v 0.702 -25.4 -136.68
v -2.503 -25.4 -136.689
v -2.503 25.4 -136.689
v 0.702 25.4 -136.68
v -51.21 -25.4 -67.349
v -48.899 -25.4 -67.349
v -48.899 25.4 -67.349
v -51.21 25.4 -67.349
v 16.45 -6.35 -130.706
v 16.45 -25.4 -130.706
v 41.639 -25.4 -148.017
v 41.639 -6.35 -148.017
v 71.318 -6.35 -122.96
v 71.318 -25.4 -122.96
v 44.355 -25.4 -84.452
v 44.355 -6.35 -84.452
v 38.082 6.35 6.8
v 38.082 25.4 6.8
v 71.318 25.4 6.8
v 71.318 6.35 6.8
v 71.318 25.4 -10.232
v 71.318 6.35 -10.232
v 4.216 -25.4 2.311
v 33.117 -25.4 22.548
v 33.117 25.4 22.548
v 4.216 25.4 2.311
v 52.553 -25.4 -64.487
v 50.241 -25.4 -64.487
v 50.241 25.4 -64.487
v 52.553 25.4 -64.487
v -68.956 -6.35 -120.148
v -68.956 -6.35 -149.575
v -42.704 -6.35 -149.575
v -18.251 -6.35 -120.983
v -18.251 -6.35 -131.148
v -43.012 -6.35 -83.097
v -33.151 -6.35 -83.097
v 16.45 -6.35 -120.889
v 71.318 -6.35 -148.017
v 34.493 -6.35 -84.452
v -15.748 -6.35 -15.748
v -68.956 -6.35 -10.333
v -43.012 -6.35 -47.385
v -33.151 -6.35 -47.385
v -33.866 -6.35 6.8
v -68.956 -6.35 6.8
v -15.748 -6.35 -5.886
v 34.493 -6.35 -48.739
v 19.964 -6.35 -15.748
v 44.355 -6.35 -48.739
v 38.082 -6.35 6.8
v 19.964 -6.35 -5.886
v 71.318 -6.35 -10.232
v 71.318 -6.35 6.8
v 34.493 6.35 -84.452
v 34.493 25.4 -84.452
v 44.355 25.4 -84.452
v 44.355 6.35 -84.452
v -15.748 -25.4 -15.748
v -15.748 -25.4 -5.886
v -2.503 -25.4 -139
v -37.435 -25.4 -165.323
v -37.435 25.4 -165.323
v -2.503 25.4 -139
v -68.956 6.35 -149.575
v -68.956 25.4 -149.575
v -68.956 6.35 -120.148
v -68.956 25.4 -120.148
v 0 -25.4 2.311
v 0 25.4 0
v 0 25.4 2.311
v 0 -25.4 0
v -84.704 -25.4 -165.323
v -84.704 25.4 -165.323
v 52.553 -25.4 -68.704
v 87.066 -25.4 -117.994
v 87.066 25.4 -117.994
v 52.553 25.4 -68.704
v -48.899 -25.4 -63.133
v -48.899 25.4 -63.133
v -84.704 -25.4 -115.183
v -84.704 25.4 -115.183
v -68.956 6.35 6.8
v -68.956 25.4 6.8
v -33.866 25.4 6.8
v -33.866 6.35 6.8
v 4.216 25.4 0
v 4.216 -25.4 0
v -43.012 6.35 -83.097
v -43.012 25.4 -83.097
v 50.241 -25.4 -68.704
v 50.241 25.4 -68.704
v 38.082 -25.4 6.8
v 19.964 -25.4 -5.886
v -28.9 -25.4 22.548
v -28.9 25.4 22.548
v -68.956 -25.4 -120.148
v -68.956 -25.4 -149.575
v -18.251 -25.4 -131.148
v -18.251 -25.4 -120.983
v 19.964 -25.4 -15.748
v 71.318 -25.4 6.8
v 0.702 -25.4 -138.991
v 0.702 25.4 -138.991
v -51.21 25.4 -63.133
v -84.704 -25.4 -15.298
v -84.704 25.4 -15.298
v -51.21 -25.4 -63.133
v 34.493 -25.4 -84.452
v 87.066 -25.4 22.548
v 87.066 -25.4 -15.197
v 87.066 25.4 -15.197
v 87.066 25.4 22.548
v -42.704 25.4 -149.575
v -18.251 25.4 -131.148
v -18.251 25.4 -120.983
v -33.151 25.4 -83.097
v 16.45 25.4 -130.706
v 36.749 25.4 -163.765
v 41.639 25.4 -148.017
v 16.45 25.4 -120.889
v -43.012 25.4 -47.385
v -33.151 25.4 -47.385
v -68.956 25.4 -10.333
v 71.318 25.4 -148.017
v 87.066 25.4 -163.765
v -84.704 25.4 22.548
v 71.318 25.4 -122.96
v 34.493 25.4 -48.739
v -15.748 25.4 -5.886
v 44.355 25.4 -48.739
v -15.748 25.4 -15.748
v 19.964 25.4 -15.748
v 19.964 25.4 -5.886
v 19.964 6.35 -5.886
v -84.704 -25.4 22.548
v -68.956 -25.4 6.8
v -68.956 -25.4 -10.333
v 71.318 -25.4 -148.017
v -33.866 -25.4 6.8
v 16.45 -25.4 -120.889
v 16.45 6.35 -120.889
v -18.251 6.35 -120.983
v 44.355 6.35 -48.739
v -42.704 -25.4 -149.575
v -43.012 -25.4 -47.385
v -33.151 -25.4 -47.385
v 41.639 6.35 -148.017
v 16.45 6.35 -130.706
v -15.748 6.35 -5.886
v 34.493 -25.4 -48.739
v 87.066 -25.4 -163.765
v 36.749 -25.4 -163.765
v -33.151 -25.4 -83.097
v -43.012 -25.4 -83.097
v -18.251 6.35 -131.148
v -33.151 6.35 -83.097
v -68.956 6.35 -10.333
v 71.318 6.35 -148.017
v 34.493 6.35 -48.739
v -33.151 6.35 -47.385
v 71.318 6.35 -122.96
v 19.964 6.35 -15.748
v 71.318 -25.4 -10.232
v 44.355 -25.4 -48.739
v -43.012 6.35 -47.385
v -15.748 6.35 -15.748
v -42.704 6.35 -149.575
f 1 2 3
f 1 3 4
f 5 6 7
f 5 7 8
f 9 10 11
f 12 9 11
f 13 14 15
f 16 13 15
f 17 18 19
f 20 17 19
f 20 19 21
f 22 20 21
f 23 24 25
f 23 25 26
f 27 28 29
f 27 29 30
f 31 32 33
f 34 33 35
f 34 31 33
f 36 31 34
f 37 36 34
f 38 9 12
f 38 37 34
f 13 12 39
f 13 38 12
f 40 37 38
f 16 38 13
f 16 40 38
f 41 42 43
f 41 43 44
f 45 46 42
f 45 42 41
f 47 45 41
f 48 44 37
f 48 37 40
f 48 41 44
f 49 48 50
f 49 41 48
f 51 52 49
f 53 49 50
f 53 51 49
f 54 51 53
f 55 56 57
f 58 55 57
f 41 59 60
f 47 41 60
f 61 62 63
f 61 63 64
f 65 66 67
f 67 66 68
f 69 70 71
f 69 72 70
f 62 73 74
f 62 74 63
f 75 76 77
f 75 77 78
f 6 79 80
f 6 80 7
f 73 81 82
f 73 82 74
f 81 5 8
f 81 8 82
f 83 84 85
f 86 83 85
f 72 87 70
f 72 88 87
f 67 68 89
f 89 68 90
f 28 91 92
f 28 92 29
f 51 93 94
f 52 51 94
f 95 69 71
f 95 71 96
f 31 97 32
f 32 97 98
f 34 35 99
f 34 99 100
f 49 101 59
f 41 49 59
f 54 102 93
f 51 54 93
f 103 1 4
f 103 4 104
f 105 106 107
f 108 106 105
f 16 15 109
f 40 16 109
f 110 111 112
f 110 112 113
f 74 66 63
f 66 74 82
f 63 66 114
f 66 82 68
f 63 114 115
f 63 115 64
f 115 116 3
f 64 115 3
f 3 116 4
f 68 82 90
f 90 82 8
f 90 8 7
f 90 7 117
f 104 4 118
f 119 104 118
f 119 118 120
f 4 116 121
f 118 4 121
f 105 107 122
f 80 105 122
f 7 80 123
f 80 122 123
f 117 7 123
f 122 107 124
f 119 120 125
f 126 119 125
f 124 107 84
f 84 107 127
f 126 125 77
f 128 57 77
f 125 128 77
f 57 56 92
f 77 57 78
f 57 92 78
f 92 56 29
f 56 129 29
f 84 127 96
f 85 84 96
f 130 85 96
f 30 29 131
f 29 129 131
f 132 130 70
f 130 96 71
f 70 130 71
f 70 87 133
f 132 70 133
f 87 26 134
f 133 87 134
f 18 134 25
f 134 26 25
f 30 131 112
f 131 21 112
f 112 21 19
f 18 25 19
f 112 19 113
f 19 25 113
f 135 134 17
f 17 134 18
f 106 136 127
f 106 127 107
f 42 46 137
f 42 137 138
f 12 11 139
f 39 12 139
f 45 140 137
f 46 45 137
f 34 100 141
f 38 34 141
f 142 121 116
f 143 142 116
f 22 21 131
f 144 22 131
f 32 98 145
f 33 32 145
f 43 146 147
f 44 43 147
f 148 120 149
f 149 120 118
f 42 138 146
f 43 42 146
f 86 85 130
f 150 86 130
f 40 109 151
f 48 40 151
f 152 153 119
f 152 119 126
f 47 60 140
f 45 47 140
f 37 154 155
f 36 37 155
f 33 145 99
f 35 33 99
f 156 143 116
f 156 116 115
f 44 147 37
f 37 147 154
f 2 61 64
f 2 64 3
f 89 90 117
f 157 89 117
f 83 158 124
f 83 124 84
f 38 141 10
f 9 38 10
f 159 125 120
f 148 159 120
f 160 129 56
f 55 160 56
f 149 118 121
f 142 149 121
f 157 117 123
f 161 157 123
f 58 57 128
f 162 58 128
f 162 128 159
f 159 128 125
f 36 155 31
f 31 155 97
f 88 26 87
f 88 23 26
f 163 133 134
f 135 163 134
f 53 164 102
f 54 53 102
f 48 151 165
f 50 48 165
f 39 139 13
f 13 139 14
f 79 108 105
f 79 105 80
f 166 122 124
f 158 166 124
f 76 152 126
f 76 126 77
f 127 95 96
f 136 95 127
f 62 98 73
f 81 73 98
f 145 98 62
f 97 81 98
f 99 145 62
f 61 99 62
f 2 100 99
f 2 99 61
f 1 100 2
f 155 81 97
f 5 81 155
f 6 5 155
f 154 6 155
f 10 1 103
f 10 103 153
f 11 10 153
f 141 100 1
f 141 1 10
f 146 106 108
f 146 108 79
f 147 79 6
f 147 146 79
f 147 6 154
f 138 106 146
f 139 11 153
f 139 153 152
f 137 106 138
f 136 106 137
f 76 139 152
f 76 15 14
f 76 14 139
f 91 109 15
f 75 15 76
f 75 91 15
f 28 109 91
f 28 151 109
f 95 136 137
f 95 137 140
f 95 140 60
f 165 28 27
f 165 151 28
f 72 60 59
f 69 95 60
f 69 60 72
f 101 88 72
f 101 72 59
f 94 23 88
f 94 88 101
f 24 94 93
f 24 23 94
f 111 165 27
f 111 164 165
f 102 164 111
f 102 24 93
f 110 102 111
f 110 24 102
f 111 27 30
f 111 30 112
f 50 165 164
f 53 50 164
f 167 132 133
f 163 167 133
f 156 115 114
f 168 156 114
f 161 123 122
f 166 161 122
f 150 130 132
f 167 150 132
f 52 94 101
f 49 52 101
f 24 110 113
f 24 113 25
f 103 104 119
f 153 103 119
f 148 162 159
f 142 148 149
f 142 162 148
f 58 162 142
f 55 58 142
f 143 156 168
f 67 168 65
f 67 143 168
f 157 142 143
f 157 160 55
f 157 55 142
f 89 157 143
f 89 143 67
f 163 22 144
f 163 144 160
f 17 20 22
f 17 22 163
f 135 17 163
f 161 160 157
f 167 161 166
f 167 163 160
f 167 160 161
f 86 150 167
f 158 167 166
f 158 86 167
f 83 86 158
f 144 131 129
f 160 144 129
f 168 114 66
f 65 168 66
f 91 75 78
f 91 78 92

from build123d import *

# Parameters (mm, degrees)
F1_DEPTH = 25.4
F3_DEPTH = 19.05
F5_DEPTH = 19.05


with BuildPart() as f1:
    # F0 (on Front) → F1 (new body, symmetric)
    with BuildSketch(Plane.XZ):
        Polygon((0, 0), (0, 2.3114), (-28.900176, 22.547521), (-84.703976, 22.547521), (-84.703976, -15.298479), (-51.210209, -63.132535), (-48.898809, -63.132535), (-48.898809, -67.348935), (-51.210209, -67.348935), (-84.703976, -115.182991), (-84.703976, -165.322591), (-37.434576, -165.322591), (-2.503217, -138.999924), (-2.503217, -136.688524), (0.702485, -136.679767), (0.702485, -138.991167), (36.748776, -163.765096), (87.066176, -163.765096), (87.066176, -117.994296), (52.55259, -68.703787), (50.24119, -68.703787), (50.24119, -64.487387), (52.55259, -64.487387), (87.066176, -15.196879), (87.066176, 22.547521), (33.116576, 22.547521), (4.2164, 2.3114), (4.2164, 0), align=None)
    extrude(amount=F1_DEPTH, both=True)

    # F2 (on face) → F3 (cut)
    with BuildSketch(Plane.XZ.offset(25.4)):
        Polygon((-18.251217, -120.983487), (16.450485, -120.888687), (16.450485, -130.705743), (41.63866, -148.017096), (71.318176, -148.017096), (71.318176, -122.959621), (44.3547, -84.451787), (34.49319, -84.451787), (34.49319, -48.739387), (44.3547, -48.739387), (71.318176, -10.231554), (71.318176, 6.799521), (38.081901, 6.799521), (19.9644, -5.88649), (19.9644, -15.748), (-15.748, -15.748), (-15.748, -5.88649), (-33.865501, 6.799521), (-68.955976, 6.799521), (-68.955976, -10.333154), (-43.012319, -47.384535), (-33.150809, -47.384535), (-33.150809, -83.096935), (-43.012319, -83.096935), (-68.955976, -120.148316), (-68.955976, -149.574591), (-42.703783, -149.574591), (-18.251217, -131.148261), align=None)
    extrude(amount=-F3_DEPTH, mode=Mode.SUBTRACT)

    # F4 (on face) → F5 (cut)
    with BuildSketch(Plane(origin=(0, 25.4, 0), x_dir=(-1, 0, 0), z_dir=(0, 1, 0))):
        Polygon((-71.318176, -122.959621), (-71.318176, -148.017096), (-41.63866, -148.017096), (-16.450485, -130.705743), (-16.450485, -120.888687), (18.251217, -120.983487), (18.251217, -131.148261), (42.703783, -149.574591), (68.955976, -149.574591), (68.955976, -120.148316), (43.012319, -83.096935), (33.150809, -83.096935), (33.150809, -47.384535), (43.012319, -47.384535), (68.955976, -10.333154), (68.955976, 6.799521), (33.865501, 6.799521), (15.748, -5.88649), (15.748, -15.748), (-19.9644, -15.748), (-19.9644, -5.88649), (-38.081901, 6.799521), (-71.318176, 6.799521), (-71.318176, -10.231554), (-44.3547, -48.739387), (-34.49319, -48.739387), (-34.49319, -84.451787), (-44.3547, -84.451787), align=None)
    extrude(amount=-F5_DEPTH, mode=Mode.SUBTRACT)


solid = f1.part
